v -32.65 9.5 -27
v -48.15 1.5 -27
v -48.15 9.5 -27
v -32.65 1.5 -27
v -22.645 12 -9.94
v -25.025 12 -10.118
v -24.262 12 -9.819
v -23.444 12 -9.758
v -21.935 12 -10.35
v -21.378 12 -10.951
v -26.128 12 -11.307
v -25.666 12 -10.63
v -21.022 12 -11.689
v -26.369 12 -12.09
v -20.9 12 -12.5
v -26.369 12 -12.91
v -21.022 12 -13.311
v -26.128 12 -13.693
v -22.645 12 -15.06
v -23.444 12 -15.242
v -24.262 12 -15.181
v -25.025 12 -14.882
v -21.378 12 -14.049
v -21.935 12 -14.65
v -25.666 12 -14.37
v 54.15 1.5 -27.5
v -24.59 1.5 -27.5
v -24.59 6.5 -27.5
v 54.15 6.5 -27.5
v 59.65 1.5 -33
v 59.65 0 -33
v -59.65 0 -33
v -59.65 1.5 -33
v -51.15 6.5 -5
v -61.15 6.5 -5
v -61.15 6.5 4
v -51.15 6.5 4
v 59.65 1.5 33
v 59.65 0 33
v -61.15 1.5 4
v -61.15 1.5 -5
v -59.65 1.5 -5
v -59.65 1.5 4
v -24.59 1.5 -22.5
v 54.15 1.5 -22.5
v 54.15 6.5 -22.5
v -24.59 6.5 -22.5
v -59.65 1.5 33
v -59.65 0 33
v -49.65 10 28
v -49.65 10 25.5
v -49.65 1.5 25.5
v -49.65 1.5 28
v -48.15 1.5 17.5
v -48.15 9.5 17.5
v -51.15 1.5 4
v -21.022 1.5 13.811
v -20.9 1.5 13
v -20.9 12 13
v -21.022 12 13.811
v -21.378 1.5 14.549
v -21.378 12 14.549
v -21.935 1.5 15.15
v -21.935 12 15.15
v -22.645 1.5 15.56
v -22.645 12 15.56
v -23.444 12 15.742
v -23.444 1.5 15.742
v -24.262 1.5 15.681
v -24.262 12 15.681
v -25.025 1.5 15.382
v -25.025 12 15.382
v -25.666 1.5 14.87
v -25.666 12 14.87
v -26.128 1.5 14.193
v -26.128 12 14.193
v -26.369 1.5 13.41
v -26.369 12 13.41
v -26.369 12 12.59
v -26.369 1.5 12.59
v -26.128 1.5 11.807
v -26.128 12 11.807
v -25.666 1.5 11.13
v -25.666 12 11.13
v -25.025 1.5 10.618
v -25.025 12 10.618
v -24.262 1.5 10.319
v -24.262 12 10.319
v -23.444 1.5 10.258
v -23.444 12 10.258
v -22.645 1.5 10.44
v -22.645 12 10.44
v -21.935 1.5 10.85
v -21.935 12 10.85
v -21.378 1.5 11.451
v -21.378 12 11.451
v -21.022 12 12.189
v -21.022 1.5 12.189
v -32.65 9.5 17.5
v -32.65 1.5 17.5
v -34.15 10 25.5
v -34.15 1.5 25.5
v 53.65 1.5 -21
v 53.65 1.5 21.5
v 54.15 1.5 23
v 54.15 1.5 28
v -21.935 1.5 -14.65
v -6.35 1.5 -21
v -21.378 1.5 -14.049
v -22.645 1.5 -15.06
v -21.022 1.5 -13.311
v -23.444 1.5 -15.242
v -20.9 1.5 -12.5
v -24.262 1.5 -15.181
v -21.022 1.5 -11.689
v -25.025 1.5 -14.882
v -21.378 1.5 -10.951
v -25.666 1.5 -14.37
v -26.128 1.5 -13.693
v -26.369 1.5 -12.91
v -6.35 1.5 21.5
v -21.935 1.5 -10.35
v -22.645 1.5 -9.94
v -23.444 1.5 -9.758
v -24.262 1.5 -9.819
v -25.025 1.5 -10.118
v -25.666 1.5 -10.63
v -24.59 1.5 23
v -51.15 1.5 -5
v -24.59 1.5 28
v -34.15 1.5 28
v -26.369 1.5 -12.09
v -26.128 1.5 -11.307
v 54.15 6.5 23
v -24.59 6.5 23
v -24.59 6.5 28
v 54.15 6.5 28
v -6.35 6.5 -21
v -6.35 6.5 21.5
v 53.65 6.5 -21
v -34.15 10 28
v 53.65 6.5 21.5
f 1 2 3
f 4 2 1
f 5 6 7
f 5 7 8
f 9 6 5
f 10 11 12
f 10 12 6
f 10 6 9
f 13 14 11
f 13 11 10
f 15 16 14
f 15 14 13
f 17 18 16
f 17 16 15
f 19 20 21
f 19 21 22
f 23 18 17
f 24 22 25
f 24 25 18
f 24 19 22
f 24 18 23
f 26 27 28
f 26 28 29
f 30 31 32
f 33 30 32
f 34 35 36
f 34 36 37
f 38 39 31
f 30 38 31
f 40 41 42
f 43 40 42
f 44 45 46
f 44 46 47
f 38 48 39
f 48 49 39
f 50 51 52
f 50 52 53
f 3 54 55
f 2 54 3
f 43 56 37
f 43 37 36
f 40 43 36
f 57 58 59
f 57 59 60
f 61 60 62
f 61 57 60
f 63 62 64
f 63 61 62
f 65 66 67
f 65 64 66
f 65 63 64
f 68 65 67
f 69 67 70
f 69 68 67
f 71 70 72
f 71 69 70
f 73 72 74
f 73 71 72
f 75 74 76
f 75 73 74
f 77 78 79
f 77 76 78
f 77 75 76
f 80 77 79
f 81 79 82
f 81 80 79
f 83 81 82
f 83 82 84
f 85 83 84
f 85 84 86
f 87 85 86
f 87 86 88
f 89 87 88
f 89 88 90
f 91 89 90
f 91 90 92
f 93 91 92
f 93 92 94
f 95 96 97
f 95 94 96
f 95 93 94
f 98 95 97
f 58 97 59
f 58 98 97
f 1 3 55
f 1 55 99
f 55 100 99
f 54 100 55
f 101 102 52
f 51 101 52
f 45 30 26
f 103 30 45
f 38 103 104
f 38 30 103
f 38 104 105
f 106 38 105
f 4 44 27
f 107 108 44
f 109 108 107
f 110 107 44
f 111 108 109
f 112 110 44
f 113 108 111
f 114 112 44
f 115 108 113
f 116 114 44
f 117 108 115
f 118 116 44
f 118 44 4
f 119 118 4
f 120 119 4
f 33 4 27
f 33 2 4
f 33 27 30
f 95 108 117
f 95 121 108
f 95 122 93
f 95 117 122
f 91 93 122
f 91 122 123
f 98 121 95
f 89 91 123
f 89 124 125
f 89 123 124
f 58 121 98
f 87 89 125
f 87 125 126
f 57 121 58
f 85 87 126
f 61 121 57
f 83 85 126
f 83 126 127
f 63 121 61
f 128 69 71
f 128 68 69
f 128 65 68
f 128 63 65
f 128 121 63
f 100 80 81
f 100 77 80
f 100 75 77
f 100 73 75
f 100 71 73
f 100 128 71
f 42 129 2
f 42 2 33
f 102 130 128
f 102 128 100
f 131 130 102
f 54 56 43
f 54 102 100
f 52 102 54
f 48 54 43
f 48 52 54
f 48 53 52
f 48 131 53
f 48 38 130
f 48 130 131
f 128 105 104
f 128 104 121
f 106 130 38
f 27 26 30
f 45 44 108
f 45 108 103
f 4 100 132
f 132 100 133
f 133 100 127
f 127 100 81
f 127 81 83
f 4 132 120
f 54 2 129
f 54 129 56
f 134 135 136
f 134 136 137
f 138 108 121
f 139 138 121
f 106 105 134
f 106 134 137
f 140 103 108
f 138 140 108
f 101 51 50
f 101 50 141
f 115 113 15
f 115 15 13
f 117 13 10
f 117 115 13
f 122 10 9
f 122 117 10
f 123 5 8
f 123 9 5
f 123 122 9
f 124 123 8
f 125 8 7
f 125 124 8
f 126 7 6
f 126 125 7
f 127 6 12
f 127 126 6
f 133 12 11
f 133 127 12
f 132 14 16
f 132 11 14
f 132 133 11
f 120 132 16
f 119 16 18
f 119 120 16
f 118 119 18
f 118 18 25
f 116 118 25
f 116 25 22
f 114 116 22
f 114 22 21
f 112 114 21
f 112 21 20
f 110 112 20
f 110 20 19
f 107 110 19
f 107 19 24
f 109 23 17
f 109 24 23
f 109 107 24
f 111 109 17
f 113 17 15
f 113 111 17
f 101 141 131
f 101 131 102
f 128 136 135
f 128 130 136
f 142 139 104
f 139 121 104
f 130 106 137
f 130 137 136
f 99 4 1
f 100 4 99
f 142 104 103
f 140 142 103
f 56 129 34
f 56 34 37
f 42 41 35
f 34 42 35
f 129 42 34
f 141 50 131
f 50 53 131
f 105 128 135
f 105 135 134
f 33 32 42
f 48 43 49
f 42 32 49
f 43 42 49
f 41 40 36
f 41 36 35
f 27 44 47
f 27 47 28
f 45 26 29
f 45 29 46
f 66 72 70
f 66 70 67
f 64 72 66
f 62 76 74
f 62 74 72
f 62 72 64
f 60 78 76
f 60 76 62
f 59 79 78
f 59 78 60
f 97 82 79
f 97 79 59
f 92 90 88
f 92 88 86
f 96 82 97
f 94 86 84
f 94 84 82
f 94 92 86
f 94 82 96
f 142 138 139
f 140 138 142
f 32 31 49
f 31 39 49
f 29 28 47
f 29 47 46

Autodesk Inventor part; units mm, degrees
ref_plane "YZ Plane" through (0, 0, 0) normal (1, 0, 0) x (0, 1, 0)
ref_plane "XZ Plane" through (0, 0, 0) normal (0, 1, 0) x (-1, 0, 0)
ref_plane "XY Plane" through (0, 0, 0) normal (0, 0, 1) x (1, 0, 0)
sketch "Szkic1" plane through (0, 0, 0) normal (0, 1, 0) x (-1, 0, 0)
  line L0 (-59.65, -33) -> (59.65, -33)
  line L1 (59.65, -33) -> (59.65, 33)
  line L2 (59.65, 33) -> (-59.65, 33)
  line L3 (-59.65, 33) -> (-59.65, -33)
  line L4 (-59.65, -33) -> (59.65, 33) construction
  line L5 (59.65, -33) -> (-59.65, 33) construction
  point P0 (0, 0)
  dimension "d0" = 119.3
  dimension "d1" = 66
extrude "Wyciągnięcie proste1" add sketch "Szkic1" along normal blind 1.5
sketch "Szkic3" plane through (0, 1.5, 0) normal (0, 1, 0) x (1, 0, 0)
  line L0 (54.15, -28) -> (-24.59, -28)
  line L1 (-24.59, -28) -> (-24.59, -23)
  line L2 (-24.59, -23) -> (54.15, -23)
  line L3 (54.15, -23) -> (54.15, -28)
  line L4 (-59.65, -33) -> (59.65, -33) projected
  line L5 (59.65, -33) -> (59.65, 33) projected
  line L6 (83.51, 0) -> (-83.51, 0) projected
  point P0 (0, 0)
  dimension "d9" = 78.74
  dimension "d10" = 5
  dimension "d11" = 5
  dimension "d12" = 5.5
extrude "Wyciągnięcie proste6" add sketch "Szkic3" along normal blind 5
sketch "Szkic4" plane through (0, 1.5, 0) normal (0, 1, 0) x (1, 0, 0)
  line L0 (-34.15, -25.5) -> (-49.65, -25.5)
  line L1 (-49.65, -25.5) -> (-49.65, -28)
  line L2 (-49.65, -28) -> (-34.15, -28)
  line L3 (-34.15, -28) -> (-34.15, -25.5)
  line L4 (-59.65, -33) -> (59.65, -33) projected
  line L5 (-59.65, 33) -> (-59.65, -33) projected
  point P0 (0, 0)
  dimension "d17" = 15.5
  dimension "d18" = 2.5
  dimension "d61" = 10
  dimension "d62" = 5
extrude "Wyciągnięcie proste4" add sketch "Szkic4" along normal blind 8.5
sketch "Szkic5" plane through (0, 1.5, 0) normal (0, 1, 0) x (1, 0, 0)
  line L0 (53.65, 21) -> (-6.35, 21)
  line L1 (-6.35, 21) -> (-6.35, -21.5)
  line L2 (-6.35, -21.5) -> (53.65, -21.5)
  line L3 (53.65, -21.5) -> (53.65, 21)
  line L4 (53.65, 21) -> (-6.35, -21.5) construction
  line L5 (-6.35, 21) -> (53.65, -21.5) construction
  line L6 (59.65, -33) -> (59.65, 33) projected
  line L7 (-59.65, -33) -> (59.65, -33) projected
  point P0 (0, 0)
  point P1 (23.65, -0.25)
  dimension "d25" = 60
  dimension "d26" = 42.5
  dimension "d28" = 6
  dimension "d36" = 11.5
extrude "Wyciągnięcie proste5" add sketch "Szkic5" along normal blind 5
pattern_linear "Szyk prostokątny1" count 2 spacing 50.5 along (0, 0, -1) of "Wyciągnięcie proste6"
sketch "Szkic6" plane through (0, 1.5, 0) normal (0, 1, 0) x (1, 0, 0)
  line L0 (-51.15, -4) -> (-61.15, -4)
  line L1 (-61.15, -4) -> (-61.15, 5)
  line L2 (-61.15, 5) -> (-51.15, 5)
  line L3 (-51.15, 5) -> (-51.15, -4)
  line L4 (-51.15, -4) -> (-61.15, 5) construction
  line L5 (-61.15, -4) -> (-51.15, 5) construction
  line L6 (-59.65, -33) -> (59.65, -33) projected
  line L7 (-59.65, 33) -> (-59.65, -33) projected
  point P0 (0, 0)
  point P1 (-56.15, 0.5)
  dimension "d37" = 10
  dimension "d38" = 9
  dimension "d39" = 29
  dimension "d40" = 1.5
extrude "Wyciągnięcie proste7" add sketch "Szkic6" along normal blind 5
sketch "Szkic7" plane through (0, 1.5, 0) normal (0, 1, 0) x (1, 0, 0)
  circle A0 centre (-23.65, -13) radius 2.75
  line L0 (-59.65, 33) -> (-59.65, 5) projected
  circle A1 centre (-23.65, 12.5) radius 2.75
  line L1 (-59.65, -33) -> (59.65, -33) projected
  point P0 (0, 0)
  dimension "d43" = 5.5
  dimension "d46" = 25.5
  dimension "d51" = 20
  dimension "d52" = 36
extrude "Wyciągnięcie proste8" add sketch "Szkic7" along normal blind 10.5
sketch "Szkic8" plane through (0, 1.5, 0) normal (0, 1, 0) x (1, 0, 0)
  line L0 (-32.65, -17.5) -> (-48.15, -17.5)
  line L1 (-48.15, -17.5) -> (-48.15, 27)
  line L2 (-48.15, 27) -> (-32.65, 27)
  line L3 (-32.65, 27) -> (-32.65, -17.5)
  line L4 (-32.65, -17.5) -> (-48.15, 27) construction
  line L5 (-48.15, -17.5) -> (-32.65, 27) construction
  line L6 (-59.65, -33) -> (59.65, -33) projected
  line L7 (-59.65, -4) -> (-59.65, -33) projected
  point P0 (0, 0)
  point P1 (-40.4, 4.75)
  dimension "d55" = 15.5
  dimension "d56" = 27
  dimension "d57" = 44.5
  dimension "d58" = 15.5
extrude "Wyciągnięcie proste9" add sketch "Szkic8" along normal blind 8
properties part number "stm32f429"
